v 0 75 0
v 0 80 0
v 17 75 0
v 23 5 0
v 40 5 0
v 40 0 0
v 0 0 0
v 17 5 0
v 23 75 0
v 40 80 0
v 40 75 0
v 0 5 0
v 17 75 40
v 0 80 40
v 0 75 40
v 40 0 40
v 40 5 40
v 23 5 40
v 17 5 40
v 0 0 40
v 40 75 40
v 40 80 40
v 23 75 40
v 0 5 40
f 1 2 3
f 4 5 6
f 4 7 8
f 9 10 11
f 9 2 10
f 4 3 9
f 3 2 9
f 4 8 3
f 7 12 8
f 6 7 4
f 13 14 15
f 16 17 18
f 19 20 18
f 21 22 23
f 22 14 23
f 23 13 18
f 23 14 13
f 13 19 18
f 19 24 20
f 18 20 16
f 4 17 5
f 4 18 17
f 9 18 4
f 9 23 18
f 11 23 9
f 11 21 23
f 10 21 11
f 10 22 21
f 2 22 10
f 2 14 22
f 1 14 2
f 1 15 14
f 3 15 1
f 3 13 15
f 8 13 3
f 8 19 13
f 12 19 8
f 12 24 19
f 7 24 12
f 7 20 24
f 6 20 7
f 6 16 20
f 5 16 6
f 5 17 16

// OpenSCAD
$fn = 32;

// ----------------------------------------------------------------------
// Structural section: ibeam 40 x 80 mm
// ----------------------------------------------------------------------

// --- parameters (mm) ---
sec_w = 40;               // section width, X
sec_h = 80;               // section height, Y
flange_t = 5;             // flange thickness
web_t = 6;                // web thickness
plate_t = 40;             // cut length, Z (extrusion height)

profile = [[0, 0], [40, 0], [40, 5], [23, 5], [23, 75], [40, 75], [40, 80], [0, 80], [0, 75], [17, 75], [17, 5], [0, 5]];  // primary outline, 12 points, counter clockwise

// --- the one profile operation ---
linear_extrude(height = plate_t) polygon(points = profile);
